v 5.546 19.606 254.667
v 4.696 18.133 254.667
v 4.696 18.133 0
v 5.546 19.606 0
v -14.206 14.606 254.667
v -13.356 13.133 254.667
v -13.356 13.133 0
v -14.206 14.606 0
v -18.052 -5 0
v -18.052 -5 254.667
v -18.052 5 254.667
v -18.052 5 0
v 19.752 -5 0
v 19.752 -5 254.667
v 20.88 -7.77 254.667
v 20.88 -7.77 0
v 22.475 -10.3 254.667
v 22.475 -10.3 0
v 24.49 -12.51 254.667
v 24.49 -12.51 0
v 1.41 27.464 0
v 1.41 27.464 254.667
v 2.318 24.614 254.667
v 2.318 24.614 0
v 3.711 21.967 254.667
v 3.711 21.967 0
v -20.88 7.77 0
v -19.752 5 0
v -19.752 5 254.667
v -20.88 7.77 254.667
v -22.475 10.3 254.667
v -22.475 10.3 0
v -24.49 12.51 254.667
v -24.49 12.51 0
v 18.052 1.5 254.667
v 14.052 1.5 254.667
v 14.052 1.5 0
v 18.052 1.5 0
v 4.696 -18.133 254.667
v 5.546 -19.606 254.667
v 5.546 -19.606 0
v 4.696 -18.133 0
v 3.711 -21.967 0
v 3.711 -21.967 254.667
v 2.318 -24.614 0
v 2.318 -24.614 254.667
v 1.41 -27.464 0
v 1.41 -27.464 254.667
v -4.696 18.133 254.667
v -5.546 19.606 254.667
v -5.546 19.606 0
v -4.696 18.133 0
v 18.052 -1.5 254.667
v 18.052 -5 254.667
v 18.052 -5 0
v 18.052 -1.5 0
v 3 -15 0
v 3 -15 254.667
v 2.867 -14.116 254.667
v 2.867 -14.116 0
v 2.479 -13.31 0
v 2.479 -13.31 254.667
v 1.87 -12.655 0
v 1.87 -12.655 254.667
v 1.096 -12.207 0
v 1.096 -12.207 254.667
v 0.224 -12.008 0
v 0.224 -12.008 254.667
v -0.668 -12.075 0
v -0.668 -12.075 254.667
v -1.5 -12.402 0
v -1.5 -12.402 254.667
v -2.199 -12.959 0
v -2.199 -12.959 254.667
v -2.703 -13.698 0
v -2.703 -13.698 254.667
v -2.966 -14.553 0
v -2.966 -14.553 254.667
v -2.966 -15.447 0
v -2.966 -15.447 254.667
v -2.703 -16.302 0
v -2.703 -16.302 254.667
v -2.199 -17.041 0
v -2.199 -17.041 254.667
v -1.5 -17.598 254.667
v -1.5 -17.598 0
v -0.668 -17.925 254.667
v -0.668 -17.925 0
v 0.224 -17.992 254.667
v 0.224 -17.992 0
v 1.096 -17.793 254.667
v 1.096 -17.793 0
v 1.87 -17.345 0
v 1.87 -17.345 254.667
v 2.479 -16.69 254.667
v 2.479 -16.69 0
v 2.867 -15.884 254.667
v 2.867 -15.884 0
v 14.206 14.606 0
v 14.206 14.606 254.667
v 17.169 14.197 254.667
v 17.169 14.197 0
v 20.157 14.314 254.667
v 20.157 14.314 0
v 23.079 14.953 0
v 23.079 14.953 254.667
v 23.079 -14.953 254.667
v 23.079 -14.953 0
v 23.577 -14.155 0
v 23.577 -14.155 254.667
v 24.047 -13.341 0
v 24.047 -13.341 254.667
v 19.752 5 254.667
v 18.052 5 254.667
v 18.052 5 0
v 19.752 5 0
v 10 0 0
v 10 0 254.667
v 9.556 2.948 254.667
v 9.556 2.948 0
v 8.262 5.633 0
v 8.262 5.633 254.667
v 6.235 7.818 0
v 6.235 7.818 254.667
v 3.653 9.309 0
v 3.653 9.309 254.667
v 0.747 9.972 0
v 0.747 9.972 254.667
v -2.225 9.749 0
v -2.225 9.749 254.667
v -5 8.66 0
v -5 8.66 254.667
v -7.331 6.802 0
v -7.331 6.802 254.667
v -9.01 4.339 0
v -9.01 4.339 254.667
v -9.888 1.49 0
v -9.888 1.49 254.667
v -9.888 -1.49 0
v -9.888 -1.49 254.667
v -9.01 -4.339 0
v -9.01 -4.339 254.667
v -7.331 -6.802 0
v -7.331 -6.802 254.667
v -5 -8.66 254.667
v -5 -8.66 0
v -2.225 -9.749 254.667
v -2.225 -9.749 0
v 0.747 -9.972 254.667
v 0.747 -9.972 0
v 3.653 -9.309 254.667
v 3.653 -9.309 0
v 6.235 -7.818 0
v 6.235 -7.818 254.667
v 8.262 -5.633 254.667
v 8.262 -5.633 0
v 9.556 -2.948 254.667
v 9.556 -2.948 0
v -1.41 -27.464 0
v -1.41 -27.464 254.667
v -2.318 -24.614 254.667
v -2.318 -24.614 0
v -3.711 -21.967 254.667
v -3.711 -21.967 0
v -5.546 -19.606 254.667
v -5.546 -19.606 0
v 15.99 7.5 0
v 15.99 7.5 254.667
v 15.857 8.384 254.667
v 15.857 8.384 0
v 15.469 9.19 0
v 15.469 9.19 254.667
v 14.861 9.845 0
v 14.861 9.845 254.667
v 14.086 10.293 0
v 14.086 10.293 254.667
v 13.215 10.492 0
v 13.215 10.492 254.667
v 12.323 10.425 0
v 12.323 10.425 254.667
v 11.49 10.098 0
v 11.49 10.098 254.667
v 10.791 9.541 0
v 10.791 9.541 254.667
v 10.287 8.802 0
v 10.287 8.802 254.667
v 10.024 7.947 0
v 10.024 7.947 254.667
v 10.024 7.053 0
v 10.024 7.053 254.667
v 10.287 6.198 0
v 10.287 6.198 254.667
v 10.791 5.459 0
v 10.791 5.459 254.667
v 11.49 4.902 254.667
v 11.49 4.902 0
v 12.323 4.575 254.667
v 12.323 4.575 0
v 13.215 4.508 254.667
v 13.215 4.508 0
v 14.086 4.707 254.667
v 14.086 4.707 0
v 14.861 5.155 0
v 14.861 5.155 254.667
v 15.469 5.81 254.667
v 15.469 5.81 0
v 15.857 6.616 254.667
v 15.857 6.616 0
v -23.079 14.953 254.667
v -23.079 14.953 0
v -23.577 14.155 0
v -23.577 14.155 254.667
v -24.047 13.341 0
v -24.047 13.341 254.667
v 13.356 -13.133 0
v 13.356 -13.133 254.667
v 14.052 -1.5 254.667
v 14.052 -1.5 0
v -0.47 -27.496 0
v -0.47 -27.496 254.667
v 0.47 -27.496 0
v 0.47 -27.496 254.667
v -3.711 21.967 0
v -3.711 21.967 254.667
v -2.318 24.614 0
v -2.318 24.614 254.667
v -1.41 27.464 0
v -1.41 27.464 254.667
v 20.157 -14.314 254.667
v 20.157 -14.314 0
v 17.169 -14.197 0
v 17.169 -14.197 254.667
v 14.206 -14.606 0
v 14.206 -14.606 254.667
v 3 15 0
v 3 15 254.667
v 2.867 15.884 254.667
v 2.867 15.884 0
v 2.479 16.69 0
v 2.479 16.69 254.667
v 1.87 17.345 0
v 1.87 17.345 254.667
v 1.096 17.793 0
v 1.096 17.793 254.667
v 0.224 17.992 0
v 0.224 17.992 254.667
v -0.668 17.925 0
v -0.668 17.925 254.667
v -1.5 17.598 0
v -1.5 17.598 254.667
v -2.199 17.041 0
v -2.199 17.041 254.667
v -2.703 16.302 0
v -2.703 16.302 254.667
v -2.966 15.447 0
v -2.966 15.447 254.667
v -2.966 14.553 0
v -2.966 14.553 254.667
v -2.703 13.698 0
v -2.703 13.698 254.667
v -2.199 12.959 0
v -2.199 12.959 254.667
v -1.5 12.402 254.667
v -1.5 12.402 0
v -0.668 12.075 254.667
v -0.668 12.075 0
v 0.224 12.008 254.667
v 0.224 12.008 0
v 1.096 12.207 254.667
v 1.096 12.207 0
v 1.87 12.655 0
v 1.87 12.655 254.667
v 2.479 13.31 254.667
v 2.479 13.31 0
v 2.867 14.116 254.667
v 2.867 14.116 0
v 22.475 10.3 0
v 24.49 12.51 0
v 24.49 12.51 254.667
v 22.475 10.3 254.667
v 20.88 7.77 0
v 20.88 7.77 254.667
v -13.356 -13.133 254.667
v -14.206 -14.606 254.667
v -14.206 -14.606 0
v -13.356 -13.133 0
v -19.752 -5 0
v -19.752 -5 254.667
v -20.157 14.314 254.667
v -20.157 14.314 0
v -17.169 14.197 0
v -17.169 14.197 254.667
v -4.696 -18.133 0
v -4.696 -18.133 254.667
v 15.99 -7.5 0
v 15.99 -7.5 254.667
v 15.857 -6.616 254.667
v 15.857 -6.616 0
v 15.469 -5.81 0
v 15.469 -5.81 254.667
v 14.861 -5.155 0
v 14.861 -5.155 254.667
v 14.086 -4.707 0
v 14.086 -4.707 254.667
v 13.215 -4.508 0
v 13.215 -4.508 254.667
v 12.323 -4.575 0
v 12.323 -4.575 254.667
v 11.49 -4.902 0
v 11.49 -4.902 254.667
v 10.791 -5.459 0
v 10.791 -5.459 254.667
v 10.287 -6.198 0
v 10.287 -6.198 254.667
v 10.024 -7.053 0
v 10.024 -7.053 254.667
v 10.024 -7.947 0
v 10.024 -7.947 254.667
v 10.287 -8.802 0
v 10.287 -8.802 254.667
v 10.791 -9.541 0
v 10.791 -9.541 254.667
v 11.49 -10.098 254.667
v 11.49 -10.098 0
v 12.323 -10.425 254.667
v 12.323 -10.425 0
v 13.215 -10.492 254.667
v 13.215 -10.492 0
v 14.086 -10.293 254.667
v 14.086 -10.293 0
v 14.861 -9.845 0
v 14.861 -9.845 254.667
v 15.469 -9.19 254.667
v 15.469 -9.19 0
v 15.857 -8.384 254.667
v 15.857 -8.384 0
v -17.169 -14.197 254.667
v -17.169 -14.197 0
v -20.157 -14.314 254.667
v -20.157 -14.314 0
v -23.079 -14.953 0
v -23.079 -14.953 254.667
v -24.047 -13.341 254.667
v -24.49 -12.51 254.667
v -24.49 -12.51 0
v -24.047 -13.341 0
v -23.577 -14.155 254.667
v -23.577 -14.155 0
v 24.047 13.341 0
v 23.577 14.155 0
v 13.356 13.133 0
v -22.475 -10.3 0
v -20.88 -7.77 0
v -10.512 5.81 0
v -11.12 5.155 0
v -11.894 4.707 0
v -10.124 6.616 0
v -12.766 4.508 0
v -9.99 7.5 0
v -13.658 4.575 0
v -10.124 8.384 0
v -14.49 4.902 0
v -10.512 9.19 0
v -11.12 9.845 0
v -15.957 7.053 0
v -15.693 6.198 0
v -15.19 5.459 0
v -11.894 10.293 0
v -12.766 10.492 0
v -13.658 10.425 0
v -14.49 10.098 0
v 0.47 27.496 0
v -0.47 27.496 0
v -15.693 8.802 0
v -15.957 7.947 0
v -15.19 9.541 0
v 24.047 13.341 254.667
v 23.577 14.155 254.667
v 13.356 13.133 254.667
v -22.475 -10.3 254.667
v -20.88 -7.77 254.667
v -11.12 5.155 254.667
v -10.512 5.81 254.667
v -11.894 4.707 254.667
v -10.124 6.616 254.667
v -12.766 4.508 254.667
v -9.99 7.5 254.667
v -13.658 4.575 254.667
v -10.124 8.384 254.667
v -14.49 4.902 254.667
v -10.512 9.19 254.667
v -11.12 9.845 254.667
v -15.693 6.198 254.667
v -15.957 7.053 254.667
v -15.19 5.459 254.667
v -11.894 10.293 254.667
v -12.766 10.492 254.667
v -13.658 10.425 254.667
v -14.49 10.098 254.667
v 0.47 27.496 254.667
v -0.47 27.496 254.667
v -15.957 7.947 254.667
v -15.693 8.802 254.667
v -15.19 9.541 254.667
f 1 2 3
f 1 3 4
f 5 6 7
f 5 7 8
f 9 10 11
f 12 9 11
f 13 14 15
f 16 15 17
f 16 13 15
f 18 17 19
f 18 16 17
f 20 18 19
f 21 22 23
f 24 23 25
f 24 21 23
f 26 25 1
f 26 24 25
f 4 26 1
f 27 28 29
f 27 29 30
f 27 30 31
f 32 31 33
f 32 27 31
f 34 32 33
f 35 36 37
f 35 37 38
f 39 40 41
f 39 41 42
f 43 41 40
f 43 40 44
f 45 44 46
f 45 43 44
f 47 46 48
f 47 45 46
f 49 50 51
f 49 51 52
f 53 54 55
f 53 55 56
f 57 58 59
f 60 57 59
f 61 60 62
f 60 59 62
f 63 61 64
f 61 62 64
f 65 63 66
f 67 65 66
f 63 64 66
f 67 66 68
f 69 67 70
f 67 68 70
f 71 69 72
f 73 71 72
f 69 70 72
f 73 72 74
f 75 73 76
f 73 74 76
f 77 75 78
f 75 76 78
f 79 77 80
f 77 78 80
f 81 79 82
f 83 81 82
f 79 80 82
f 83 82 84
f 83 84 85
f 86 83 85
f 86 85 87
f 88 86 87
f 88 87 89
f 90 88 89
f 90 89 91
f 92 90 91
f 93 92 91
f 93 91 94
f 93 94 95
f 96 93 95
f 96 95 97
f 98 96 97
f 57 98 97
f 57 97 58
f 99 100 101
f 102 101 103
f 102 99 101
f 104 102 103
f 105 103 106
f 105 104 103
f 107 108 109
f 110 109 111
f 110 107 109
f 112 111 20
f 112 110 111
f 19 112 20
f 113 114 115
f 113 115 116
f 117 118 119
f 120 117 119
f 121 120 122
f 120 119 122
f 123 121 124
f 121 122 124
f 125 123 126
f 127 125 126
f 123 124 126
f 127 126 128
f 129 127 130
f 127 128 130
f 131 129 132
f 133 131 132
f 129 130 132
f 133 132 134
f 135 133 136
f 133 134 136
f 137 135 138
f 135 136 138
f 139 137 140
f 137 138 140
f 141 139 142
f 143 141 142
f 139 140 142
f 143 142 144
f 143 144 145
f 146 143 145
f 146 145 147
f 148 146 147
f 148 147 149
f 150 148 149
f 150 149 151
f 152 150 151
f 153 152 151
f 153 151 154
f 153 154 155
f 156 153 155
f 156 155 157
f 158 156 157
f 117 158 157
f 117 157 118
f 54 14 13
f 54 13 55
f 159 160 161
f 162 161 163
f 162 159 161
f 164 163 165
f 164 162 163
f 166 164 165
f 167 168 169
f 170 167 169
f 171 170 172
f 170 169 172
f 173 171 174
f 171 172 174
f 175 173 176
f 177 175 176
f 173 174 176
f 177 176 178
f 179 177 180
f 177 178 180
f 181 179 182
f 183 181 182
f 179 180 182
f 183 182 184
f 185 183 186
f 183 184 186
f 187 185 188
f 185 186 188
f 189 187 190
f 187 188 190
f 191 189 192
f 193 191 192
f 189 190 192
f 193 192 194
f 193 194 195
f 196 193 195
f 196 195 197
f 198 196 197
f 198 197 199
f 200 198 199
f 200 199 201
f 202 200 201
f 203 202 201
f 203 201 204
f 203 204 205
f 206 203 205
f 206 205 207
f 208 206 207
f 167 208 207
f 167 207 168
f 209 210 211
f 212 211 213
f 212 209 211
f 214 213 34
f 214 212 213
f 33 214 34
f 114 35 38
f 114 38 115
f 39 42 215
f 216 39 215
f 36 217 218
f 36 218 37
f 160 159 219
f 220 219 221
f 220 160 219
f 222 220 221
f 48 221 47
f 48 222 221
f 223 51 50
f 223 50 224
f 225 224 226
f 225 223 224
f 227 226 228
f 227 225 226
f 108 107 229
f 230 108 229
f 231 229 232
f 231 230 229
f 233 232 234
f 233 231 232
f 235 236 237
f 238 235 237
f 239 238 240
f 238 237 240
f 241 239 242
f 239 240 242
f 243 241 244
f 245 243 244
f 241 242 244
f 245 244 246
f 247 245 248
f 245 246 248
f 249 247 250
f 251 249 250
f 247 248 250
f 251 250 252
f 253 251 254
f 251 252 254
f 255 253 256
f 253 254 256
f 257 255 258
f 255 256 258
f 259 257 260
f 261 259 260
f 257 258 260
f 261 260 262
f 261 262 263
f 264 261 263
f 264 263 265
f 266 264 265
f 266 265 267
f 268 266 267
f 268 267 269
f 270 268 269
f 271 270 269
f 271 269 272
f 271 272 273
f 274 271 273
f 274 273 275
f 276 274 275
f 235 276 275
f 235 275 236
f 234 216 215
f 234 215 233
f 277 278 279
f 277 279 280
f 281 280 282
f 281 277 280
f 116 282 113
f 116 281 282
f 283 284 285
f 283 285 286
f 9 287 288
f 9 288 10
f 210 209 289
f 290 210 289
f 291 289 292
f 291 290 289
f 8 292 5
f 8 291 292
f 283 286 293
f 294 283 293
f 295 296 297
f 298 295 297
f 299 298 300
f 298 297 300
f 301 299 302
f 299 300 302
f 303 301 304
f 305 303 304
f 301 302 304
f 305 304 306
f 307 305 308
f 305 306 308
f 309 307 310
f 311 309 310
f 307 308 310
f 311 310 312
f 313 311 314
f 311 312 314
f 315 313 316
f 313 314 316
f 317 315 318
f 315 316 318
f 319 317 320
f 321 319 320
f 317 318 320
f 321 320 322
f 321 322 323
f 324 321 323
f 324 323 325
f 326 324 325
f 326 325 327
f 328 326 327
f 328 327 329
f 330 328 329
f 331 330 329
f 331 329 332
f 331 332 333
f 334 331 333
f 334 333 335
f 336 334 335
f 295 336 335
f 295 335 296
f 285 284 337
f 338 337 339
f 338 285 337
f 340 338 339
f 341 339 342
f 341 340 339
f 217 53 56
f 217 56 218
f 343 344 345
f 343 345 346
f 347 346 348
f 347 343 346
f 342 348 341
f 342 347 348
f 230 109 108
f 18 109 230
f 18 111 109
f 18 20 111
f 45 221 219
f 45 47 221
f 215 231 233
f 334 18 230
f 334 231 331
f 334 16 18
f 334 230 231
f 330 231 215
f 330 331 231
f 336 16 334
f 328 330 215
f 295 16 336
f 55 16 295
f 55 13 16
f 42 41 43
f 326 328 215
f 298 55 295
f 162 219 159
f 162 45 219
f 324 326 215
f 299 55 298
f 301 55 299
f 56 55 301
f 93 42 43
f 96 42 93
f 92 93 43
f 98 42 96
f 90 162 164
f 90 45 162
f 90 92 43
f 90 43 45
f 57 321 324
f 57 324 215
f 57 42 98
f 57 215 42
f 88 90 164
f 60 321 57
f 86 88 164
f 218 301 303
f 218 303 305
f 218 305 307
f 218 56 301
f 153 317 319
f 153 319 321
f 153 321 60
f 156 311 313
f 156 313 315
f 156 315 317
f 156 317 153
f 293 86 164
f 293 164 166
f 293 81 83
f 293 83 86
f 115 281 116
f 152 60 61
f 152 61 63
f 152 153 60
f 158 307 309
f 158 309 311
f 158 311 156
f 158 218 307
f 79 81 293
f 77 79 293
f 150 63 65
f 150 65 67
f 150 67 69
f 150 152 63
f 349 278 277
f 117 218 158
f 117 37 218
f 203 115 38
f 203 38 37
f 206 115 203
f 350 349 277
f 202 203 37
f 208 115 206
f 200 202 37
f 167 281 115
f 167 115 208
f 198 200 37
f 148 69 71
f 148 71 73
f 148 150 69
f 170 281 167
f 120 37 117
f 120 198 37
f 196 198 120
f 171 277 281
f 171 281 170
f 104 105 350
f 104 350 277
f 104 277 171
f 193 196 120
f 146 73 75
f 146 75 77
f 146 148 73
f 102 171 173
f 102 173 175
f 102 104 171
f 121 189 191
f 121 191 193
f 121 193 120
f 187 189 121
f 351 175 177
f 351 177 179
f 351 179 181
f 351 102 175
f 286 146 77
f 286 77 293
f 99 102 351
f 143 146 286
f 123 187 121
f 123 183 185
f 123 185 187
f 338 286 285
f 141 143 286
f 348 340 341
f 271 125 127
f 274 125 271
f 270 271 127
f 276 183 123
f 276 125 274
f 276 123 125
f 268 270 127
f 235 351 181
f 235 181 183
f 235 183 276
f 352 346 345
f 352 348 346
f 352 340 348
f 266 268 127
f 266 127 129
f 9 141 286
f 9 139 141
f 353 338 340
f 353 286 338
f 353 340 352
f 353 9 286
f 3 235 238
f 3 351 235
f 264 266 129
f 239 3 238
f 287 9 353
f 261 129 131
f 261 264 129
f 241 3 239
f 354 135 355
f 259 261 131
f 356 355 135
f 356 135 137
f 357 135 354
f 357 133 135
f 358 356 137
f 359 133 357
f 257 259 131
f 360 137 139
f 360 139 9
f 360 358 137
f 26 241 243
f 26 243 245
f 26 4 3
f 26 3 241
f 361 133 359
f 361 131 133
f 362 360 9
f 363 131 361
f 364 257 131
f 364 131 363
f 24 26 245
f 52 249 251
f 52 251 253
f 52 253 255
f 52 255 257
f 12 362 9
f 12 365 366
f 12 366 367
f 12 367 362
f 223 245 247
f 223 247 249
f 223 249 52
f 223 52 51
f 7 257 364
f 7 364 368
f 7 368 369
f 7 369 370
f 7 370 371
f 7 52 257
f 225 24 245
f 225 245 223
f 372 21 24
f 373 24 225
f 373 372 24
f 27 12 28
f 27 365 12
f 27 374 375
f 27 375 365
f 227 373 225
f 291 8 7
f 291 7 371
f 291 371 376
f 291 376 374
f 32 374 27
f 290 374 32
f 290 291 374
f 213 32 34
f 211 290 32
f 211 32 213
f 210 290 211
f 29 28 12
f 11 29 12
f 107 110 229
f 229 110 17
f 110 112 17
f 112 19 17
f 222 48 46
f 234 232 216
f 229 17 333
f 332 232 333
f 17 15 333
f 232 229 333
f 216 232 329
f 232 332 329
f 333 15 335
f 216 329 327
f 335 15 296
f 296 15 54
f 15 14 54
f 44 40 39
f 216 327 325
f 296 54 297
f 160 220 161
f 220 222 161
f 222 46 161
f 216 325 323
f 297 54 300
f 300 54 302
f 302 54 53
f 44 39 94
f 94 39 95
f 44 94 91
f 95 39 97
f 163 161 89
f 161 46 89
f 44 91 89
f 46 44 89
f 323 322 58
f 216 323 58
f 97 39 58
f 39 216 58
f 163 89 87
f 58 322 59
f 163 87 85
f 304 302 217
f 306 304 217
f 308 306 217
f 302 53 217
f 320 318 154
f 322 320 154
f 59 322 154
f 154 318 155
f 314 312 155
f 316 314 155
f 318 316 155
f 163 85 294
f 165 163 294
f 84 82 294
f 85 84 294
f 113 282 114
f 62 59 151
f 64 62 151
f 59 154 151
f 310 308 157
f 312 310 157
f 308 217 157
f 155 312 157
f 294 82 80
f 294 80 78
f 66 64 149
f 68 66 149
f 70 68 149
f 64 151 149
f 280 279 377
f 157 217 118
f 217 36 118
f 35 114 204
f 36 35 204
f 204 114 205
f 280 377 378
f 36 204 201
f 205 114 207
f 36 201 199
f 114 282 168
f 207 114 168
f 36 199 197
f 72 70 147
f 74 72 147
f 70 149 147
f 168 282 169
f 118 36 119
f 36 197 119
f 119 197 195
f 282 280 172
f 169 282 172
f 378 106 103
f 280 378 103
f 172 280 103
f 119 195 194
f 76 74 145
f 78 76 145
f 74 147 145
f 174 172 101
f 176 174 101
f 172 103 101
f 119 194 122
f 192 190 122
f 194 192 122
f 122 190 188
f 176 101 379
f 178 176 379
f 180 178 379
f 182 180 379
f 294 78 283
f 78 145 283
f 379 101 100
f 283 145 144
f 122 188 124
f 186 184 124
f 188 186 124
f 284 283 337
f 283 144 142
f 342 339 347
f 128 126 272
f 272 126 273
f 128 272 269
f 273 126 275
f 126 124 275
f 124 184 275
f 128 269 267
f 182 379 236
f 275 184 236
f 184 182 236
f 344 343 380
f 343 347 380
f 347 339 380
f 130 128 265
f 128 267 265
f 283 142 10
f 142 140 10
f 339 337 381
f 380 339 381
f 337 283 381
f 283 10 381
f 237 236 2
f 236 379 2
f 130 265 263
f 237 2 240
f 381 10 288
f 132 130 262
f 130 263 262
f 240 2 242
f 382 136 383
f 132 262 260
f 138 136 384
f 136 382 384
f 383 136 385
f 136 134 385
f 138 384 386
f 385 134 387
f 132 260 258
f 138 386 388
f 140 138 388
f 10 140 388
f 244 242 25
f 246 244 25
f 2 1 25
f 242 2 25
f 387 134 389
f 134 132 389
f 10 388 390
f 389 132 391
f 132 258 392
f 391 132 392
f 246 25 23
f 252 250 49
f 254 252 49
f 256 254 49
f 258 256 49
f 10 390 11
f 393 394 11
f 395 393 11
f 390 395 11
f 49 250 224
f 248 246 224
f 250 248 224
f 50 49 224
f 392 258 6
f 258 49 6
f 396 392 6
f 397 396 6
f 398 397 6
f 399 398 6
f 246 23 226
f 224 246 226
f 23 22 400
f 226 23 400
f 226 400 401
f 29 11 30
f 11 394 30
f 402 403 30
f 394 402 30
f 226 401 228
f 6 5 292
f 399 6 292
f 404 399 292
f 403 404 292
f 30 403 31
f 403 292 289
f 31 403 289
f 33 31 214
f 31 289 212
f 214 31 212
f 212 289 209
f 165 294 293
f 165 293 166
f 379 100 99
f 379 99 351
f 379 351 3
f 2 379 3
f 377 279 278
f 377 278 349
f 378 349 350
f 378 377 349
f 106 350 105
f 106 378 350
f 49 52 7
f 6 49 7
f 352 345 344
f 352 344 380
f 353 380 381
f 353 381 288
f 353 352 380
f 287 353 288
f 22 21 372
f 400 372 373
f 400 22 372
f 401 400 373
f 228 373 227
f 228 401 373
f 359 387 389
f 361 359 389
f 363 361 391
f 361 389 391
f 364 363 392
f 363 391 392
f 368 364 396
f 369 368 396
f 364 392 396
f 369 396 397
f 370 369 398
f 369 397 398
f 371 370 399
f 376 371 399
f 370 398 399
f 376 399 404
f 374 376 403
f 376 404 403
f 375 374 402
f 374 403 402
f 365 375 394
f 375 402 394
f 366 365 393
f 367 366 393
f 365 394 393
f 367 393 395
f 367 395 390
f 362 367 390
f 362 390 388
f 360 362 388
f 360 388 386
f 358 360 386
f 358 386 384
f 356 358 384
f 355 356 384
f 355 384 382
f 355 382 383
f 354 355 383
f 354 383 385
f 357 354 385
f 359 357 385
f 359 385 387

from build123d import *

# Parameters (mm, degrees)
BOSS_EXTRU_1_DEPTH      = 254.666666667
ESQUISSE4_R             = 54.250129783
ESQUISSE4_R_2           = 27.5
ENL_V_MAT_EXTRU_1_DEPTH = 266.174026394
ESQUISSE5_R             = 10
ESQUISSE5_R_2           = 3
ESQUISSE5_W             = 1.7
ESQUISSE5_H             = 10
ENL_V_MAT_EXTRU_2_DEPTH = 258.315177949


with BuildPart() as part:
    # Esquisse1 → Boss.-Extru.1 (new body)
    with BuildSketch(Plane.XY):
        with BuildLine():
            Line((-18, -51.176914536), (-18, -48.176914536))
            ThreePointArc((-18, -48.176914536), (-9.5, -16.454482672), (-32.722431864, -39.676914536))
            Line((-32.722431864, -39.676914536), (-35.320508076, -41.176914536))
            ThreePointArc((-35.320508076, -41.176914536), (-37.98683472, -30.451354144), (-34.549834435, -19.947356212))
            ThreePointArc((-34.549834435, -19.947356212), (-45.365063628, -17.671886805), (-53.320508076, -10))
            Line((-53.320508076, -10), (-50.722431864, -8.5))
            ThreePointArc((-50.722431864, -8.5), (-19, 0), (-50.722431864, 8.5))
            Line((-50.722431864, 8.5), (-53.320508076, 10))
            ThreePointArc((-53.320508076, 10), (-45.365063628, 17.671886805), (-34.549834435, 19.947356212))
            ThreePointArc((-34.549834435, 19.947356212), (-37.98683472, 30.451354144), (-35.320508076, 41.176914536))
            Line((-35.320508076, 41.176914536), (-32.722431864, 39.676914536))
            ThreePointArc((-32.722431864, 39.676914536), (-9.5, 16.454482672), (-18, 48.176914536))
            Line((-18, 48.176914536), (-18, 51.176914536))
            ThreePointArc((-18, 51.176914536), (-7.378228908, 48.123240948), (0, 39.894712423))
            ThreePointArc((0, 39.894712423), (7.378228908, 48.123240948), (18, 51.176914536))
            Line((18, 51.176914536), (18, 48.176914536))
            ThreePointArc((18, 48.176914536), (9.5, 16.454482672), (32.722431864, 39.676914536))
            Line((32.722431864, 39.676914536), (35.320508076, 41.176914536))
            ThreePointArc((35.320508076, 41.176914536), (37.98683472, 30.451354144), (34.549834435, 19.947356212))
            ThreePointArc((34.549834435, 19.947356212), (45.365063628, 17.671886805), (53.320508076, 10))
            Line((53.320508076, 10), (50.722431864, 8.5))
            ThreePointArc((50.722431864, 8.5), (19, 0), (50.722431864, -8.5))
            Line((50.722431864, -8.5), (53.320508076, -10))
            ThreePointArc((53.320508076, -10), (45.365063628, -17.671886805), (34.549834435, -19.947356212))
            ThreePointArc((34.549834435, -19.947356212), (37.98683472, -30.451354144), (35.320508076, -41.176914536))
            Line((35.320508076, -41.176914536), (32.722431864, -39.676914536))
            ThreePointArc((32.722431864, -39.676914536), (9.5, -16.454482672), (18, -48.176914536))
            Line((18, -48.176914536), (18, -51.176914536))
            ThreePointArc((18, -51.176914536), (7.378228908, -48.123240948), (0, -39.894712423))
            ThreePointArc((0, -39.894712423), (-7.378228908, -48.123240948), (-18, -51.176914536))
        make_face()
    extrude(amount=BOSS_EXTRU_1_DEPTH)

    # Esquisse4 → Enlèv. mat.-Extru.1 (cut, through all)
    with BuildSketch(Plane.XY.offset(254.666666667)):
        Circle(ESQUISSE4_R)
        Circle(ESQUISSE4_R_2, mode=Mode.SUBTRACT)
    extrude(amount=-ENL_V_MAT_EXTRU_1_DEPTH, mode=Mode.SUBTRACT)

    # Esquisse5 → Enlèv. mat.-Extru.2 (cut, through all)
    with BuildSketch(Plane.XY.offset(254.666666667)):
        Circle(ESQUISSE5_R)
        with Locations((0, 15)):
            Circle(ESQUISSE5_R_2)
        with Locations((12.990381057, 7.5)):
            Circle(ESQUISSE5_R_2)
        with Locations((12.990381057, -7.5)):
            Circle(ESQUISSE5_R_2)
        with Locations((0, -15)):
            Circle(ESQUISSE5_R_2)
        with Locations((-12.990381057, 7.5)):
            Circle(ESQUISSE5_R_2)
        Polygon((14.206088614, -14.605667257), (5.545834576, -19.605667257), (4.695834576, -18.13342407), (13.356088614, -13.13342407), align=None)
        Polygon((18.051923191, 5), (19.751923191, 5), (19.751923191, -5), (18.051923191, -5), (18.051923191, -1.5), (14.051923191, -1.5), (14.051923191, 1.5), (18.051923191, 1.5), align=None)
        Polygon((-5.545834576, -19.605667257), (-14.206088614, -14.605667257), (-13.356088614, -13.13342407), (-4.695834576, -18.13342407), align=None)
        with Locations((-18.901923191, 0)):
            Rectangle(ESQUISSE5_W, ESQUISSE5_H)
        Polygon((-14.206088614, 14.605667257), (-5.545834576, 19.605667257), (-4.695834576, 18.13342407), (-13.356088614, 13.13342407), align=None)
        Polygon((5.545834576, 19.605667257), (14.206088614, 14.605667257), (13.356088614, 13.13342407), (4.695834576, 18.13342407), align=None)
    extrude(amount=-ENL_V_MAT_EXTRU_2_DEPTH, mode=Mode.SUBTRACT)


solid = part.part
